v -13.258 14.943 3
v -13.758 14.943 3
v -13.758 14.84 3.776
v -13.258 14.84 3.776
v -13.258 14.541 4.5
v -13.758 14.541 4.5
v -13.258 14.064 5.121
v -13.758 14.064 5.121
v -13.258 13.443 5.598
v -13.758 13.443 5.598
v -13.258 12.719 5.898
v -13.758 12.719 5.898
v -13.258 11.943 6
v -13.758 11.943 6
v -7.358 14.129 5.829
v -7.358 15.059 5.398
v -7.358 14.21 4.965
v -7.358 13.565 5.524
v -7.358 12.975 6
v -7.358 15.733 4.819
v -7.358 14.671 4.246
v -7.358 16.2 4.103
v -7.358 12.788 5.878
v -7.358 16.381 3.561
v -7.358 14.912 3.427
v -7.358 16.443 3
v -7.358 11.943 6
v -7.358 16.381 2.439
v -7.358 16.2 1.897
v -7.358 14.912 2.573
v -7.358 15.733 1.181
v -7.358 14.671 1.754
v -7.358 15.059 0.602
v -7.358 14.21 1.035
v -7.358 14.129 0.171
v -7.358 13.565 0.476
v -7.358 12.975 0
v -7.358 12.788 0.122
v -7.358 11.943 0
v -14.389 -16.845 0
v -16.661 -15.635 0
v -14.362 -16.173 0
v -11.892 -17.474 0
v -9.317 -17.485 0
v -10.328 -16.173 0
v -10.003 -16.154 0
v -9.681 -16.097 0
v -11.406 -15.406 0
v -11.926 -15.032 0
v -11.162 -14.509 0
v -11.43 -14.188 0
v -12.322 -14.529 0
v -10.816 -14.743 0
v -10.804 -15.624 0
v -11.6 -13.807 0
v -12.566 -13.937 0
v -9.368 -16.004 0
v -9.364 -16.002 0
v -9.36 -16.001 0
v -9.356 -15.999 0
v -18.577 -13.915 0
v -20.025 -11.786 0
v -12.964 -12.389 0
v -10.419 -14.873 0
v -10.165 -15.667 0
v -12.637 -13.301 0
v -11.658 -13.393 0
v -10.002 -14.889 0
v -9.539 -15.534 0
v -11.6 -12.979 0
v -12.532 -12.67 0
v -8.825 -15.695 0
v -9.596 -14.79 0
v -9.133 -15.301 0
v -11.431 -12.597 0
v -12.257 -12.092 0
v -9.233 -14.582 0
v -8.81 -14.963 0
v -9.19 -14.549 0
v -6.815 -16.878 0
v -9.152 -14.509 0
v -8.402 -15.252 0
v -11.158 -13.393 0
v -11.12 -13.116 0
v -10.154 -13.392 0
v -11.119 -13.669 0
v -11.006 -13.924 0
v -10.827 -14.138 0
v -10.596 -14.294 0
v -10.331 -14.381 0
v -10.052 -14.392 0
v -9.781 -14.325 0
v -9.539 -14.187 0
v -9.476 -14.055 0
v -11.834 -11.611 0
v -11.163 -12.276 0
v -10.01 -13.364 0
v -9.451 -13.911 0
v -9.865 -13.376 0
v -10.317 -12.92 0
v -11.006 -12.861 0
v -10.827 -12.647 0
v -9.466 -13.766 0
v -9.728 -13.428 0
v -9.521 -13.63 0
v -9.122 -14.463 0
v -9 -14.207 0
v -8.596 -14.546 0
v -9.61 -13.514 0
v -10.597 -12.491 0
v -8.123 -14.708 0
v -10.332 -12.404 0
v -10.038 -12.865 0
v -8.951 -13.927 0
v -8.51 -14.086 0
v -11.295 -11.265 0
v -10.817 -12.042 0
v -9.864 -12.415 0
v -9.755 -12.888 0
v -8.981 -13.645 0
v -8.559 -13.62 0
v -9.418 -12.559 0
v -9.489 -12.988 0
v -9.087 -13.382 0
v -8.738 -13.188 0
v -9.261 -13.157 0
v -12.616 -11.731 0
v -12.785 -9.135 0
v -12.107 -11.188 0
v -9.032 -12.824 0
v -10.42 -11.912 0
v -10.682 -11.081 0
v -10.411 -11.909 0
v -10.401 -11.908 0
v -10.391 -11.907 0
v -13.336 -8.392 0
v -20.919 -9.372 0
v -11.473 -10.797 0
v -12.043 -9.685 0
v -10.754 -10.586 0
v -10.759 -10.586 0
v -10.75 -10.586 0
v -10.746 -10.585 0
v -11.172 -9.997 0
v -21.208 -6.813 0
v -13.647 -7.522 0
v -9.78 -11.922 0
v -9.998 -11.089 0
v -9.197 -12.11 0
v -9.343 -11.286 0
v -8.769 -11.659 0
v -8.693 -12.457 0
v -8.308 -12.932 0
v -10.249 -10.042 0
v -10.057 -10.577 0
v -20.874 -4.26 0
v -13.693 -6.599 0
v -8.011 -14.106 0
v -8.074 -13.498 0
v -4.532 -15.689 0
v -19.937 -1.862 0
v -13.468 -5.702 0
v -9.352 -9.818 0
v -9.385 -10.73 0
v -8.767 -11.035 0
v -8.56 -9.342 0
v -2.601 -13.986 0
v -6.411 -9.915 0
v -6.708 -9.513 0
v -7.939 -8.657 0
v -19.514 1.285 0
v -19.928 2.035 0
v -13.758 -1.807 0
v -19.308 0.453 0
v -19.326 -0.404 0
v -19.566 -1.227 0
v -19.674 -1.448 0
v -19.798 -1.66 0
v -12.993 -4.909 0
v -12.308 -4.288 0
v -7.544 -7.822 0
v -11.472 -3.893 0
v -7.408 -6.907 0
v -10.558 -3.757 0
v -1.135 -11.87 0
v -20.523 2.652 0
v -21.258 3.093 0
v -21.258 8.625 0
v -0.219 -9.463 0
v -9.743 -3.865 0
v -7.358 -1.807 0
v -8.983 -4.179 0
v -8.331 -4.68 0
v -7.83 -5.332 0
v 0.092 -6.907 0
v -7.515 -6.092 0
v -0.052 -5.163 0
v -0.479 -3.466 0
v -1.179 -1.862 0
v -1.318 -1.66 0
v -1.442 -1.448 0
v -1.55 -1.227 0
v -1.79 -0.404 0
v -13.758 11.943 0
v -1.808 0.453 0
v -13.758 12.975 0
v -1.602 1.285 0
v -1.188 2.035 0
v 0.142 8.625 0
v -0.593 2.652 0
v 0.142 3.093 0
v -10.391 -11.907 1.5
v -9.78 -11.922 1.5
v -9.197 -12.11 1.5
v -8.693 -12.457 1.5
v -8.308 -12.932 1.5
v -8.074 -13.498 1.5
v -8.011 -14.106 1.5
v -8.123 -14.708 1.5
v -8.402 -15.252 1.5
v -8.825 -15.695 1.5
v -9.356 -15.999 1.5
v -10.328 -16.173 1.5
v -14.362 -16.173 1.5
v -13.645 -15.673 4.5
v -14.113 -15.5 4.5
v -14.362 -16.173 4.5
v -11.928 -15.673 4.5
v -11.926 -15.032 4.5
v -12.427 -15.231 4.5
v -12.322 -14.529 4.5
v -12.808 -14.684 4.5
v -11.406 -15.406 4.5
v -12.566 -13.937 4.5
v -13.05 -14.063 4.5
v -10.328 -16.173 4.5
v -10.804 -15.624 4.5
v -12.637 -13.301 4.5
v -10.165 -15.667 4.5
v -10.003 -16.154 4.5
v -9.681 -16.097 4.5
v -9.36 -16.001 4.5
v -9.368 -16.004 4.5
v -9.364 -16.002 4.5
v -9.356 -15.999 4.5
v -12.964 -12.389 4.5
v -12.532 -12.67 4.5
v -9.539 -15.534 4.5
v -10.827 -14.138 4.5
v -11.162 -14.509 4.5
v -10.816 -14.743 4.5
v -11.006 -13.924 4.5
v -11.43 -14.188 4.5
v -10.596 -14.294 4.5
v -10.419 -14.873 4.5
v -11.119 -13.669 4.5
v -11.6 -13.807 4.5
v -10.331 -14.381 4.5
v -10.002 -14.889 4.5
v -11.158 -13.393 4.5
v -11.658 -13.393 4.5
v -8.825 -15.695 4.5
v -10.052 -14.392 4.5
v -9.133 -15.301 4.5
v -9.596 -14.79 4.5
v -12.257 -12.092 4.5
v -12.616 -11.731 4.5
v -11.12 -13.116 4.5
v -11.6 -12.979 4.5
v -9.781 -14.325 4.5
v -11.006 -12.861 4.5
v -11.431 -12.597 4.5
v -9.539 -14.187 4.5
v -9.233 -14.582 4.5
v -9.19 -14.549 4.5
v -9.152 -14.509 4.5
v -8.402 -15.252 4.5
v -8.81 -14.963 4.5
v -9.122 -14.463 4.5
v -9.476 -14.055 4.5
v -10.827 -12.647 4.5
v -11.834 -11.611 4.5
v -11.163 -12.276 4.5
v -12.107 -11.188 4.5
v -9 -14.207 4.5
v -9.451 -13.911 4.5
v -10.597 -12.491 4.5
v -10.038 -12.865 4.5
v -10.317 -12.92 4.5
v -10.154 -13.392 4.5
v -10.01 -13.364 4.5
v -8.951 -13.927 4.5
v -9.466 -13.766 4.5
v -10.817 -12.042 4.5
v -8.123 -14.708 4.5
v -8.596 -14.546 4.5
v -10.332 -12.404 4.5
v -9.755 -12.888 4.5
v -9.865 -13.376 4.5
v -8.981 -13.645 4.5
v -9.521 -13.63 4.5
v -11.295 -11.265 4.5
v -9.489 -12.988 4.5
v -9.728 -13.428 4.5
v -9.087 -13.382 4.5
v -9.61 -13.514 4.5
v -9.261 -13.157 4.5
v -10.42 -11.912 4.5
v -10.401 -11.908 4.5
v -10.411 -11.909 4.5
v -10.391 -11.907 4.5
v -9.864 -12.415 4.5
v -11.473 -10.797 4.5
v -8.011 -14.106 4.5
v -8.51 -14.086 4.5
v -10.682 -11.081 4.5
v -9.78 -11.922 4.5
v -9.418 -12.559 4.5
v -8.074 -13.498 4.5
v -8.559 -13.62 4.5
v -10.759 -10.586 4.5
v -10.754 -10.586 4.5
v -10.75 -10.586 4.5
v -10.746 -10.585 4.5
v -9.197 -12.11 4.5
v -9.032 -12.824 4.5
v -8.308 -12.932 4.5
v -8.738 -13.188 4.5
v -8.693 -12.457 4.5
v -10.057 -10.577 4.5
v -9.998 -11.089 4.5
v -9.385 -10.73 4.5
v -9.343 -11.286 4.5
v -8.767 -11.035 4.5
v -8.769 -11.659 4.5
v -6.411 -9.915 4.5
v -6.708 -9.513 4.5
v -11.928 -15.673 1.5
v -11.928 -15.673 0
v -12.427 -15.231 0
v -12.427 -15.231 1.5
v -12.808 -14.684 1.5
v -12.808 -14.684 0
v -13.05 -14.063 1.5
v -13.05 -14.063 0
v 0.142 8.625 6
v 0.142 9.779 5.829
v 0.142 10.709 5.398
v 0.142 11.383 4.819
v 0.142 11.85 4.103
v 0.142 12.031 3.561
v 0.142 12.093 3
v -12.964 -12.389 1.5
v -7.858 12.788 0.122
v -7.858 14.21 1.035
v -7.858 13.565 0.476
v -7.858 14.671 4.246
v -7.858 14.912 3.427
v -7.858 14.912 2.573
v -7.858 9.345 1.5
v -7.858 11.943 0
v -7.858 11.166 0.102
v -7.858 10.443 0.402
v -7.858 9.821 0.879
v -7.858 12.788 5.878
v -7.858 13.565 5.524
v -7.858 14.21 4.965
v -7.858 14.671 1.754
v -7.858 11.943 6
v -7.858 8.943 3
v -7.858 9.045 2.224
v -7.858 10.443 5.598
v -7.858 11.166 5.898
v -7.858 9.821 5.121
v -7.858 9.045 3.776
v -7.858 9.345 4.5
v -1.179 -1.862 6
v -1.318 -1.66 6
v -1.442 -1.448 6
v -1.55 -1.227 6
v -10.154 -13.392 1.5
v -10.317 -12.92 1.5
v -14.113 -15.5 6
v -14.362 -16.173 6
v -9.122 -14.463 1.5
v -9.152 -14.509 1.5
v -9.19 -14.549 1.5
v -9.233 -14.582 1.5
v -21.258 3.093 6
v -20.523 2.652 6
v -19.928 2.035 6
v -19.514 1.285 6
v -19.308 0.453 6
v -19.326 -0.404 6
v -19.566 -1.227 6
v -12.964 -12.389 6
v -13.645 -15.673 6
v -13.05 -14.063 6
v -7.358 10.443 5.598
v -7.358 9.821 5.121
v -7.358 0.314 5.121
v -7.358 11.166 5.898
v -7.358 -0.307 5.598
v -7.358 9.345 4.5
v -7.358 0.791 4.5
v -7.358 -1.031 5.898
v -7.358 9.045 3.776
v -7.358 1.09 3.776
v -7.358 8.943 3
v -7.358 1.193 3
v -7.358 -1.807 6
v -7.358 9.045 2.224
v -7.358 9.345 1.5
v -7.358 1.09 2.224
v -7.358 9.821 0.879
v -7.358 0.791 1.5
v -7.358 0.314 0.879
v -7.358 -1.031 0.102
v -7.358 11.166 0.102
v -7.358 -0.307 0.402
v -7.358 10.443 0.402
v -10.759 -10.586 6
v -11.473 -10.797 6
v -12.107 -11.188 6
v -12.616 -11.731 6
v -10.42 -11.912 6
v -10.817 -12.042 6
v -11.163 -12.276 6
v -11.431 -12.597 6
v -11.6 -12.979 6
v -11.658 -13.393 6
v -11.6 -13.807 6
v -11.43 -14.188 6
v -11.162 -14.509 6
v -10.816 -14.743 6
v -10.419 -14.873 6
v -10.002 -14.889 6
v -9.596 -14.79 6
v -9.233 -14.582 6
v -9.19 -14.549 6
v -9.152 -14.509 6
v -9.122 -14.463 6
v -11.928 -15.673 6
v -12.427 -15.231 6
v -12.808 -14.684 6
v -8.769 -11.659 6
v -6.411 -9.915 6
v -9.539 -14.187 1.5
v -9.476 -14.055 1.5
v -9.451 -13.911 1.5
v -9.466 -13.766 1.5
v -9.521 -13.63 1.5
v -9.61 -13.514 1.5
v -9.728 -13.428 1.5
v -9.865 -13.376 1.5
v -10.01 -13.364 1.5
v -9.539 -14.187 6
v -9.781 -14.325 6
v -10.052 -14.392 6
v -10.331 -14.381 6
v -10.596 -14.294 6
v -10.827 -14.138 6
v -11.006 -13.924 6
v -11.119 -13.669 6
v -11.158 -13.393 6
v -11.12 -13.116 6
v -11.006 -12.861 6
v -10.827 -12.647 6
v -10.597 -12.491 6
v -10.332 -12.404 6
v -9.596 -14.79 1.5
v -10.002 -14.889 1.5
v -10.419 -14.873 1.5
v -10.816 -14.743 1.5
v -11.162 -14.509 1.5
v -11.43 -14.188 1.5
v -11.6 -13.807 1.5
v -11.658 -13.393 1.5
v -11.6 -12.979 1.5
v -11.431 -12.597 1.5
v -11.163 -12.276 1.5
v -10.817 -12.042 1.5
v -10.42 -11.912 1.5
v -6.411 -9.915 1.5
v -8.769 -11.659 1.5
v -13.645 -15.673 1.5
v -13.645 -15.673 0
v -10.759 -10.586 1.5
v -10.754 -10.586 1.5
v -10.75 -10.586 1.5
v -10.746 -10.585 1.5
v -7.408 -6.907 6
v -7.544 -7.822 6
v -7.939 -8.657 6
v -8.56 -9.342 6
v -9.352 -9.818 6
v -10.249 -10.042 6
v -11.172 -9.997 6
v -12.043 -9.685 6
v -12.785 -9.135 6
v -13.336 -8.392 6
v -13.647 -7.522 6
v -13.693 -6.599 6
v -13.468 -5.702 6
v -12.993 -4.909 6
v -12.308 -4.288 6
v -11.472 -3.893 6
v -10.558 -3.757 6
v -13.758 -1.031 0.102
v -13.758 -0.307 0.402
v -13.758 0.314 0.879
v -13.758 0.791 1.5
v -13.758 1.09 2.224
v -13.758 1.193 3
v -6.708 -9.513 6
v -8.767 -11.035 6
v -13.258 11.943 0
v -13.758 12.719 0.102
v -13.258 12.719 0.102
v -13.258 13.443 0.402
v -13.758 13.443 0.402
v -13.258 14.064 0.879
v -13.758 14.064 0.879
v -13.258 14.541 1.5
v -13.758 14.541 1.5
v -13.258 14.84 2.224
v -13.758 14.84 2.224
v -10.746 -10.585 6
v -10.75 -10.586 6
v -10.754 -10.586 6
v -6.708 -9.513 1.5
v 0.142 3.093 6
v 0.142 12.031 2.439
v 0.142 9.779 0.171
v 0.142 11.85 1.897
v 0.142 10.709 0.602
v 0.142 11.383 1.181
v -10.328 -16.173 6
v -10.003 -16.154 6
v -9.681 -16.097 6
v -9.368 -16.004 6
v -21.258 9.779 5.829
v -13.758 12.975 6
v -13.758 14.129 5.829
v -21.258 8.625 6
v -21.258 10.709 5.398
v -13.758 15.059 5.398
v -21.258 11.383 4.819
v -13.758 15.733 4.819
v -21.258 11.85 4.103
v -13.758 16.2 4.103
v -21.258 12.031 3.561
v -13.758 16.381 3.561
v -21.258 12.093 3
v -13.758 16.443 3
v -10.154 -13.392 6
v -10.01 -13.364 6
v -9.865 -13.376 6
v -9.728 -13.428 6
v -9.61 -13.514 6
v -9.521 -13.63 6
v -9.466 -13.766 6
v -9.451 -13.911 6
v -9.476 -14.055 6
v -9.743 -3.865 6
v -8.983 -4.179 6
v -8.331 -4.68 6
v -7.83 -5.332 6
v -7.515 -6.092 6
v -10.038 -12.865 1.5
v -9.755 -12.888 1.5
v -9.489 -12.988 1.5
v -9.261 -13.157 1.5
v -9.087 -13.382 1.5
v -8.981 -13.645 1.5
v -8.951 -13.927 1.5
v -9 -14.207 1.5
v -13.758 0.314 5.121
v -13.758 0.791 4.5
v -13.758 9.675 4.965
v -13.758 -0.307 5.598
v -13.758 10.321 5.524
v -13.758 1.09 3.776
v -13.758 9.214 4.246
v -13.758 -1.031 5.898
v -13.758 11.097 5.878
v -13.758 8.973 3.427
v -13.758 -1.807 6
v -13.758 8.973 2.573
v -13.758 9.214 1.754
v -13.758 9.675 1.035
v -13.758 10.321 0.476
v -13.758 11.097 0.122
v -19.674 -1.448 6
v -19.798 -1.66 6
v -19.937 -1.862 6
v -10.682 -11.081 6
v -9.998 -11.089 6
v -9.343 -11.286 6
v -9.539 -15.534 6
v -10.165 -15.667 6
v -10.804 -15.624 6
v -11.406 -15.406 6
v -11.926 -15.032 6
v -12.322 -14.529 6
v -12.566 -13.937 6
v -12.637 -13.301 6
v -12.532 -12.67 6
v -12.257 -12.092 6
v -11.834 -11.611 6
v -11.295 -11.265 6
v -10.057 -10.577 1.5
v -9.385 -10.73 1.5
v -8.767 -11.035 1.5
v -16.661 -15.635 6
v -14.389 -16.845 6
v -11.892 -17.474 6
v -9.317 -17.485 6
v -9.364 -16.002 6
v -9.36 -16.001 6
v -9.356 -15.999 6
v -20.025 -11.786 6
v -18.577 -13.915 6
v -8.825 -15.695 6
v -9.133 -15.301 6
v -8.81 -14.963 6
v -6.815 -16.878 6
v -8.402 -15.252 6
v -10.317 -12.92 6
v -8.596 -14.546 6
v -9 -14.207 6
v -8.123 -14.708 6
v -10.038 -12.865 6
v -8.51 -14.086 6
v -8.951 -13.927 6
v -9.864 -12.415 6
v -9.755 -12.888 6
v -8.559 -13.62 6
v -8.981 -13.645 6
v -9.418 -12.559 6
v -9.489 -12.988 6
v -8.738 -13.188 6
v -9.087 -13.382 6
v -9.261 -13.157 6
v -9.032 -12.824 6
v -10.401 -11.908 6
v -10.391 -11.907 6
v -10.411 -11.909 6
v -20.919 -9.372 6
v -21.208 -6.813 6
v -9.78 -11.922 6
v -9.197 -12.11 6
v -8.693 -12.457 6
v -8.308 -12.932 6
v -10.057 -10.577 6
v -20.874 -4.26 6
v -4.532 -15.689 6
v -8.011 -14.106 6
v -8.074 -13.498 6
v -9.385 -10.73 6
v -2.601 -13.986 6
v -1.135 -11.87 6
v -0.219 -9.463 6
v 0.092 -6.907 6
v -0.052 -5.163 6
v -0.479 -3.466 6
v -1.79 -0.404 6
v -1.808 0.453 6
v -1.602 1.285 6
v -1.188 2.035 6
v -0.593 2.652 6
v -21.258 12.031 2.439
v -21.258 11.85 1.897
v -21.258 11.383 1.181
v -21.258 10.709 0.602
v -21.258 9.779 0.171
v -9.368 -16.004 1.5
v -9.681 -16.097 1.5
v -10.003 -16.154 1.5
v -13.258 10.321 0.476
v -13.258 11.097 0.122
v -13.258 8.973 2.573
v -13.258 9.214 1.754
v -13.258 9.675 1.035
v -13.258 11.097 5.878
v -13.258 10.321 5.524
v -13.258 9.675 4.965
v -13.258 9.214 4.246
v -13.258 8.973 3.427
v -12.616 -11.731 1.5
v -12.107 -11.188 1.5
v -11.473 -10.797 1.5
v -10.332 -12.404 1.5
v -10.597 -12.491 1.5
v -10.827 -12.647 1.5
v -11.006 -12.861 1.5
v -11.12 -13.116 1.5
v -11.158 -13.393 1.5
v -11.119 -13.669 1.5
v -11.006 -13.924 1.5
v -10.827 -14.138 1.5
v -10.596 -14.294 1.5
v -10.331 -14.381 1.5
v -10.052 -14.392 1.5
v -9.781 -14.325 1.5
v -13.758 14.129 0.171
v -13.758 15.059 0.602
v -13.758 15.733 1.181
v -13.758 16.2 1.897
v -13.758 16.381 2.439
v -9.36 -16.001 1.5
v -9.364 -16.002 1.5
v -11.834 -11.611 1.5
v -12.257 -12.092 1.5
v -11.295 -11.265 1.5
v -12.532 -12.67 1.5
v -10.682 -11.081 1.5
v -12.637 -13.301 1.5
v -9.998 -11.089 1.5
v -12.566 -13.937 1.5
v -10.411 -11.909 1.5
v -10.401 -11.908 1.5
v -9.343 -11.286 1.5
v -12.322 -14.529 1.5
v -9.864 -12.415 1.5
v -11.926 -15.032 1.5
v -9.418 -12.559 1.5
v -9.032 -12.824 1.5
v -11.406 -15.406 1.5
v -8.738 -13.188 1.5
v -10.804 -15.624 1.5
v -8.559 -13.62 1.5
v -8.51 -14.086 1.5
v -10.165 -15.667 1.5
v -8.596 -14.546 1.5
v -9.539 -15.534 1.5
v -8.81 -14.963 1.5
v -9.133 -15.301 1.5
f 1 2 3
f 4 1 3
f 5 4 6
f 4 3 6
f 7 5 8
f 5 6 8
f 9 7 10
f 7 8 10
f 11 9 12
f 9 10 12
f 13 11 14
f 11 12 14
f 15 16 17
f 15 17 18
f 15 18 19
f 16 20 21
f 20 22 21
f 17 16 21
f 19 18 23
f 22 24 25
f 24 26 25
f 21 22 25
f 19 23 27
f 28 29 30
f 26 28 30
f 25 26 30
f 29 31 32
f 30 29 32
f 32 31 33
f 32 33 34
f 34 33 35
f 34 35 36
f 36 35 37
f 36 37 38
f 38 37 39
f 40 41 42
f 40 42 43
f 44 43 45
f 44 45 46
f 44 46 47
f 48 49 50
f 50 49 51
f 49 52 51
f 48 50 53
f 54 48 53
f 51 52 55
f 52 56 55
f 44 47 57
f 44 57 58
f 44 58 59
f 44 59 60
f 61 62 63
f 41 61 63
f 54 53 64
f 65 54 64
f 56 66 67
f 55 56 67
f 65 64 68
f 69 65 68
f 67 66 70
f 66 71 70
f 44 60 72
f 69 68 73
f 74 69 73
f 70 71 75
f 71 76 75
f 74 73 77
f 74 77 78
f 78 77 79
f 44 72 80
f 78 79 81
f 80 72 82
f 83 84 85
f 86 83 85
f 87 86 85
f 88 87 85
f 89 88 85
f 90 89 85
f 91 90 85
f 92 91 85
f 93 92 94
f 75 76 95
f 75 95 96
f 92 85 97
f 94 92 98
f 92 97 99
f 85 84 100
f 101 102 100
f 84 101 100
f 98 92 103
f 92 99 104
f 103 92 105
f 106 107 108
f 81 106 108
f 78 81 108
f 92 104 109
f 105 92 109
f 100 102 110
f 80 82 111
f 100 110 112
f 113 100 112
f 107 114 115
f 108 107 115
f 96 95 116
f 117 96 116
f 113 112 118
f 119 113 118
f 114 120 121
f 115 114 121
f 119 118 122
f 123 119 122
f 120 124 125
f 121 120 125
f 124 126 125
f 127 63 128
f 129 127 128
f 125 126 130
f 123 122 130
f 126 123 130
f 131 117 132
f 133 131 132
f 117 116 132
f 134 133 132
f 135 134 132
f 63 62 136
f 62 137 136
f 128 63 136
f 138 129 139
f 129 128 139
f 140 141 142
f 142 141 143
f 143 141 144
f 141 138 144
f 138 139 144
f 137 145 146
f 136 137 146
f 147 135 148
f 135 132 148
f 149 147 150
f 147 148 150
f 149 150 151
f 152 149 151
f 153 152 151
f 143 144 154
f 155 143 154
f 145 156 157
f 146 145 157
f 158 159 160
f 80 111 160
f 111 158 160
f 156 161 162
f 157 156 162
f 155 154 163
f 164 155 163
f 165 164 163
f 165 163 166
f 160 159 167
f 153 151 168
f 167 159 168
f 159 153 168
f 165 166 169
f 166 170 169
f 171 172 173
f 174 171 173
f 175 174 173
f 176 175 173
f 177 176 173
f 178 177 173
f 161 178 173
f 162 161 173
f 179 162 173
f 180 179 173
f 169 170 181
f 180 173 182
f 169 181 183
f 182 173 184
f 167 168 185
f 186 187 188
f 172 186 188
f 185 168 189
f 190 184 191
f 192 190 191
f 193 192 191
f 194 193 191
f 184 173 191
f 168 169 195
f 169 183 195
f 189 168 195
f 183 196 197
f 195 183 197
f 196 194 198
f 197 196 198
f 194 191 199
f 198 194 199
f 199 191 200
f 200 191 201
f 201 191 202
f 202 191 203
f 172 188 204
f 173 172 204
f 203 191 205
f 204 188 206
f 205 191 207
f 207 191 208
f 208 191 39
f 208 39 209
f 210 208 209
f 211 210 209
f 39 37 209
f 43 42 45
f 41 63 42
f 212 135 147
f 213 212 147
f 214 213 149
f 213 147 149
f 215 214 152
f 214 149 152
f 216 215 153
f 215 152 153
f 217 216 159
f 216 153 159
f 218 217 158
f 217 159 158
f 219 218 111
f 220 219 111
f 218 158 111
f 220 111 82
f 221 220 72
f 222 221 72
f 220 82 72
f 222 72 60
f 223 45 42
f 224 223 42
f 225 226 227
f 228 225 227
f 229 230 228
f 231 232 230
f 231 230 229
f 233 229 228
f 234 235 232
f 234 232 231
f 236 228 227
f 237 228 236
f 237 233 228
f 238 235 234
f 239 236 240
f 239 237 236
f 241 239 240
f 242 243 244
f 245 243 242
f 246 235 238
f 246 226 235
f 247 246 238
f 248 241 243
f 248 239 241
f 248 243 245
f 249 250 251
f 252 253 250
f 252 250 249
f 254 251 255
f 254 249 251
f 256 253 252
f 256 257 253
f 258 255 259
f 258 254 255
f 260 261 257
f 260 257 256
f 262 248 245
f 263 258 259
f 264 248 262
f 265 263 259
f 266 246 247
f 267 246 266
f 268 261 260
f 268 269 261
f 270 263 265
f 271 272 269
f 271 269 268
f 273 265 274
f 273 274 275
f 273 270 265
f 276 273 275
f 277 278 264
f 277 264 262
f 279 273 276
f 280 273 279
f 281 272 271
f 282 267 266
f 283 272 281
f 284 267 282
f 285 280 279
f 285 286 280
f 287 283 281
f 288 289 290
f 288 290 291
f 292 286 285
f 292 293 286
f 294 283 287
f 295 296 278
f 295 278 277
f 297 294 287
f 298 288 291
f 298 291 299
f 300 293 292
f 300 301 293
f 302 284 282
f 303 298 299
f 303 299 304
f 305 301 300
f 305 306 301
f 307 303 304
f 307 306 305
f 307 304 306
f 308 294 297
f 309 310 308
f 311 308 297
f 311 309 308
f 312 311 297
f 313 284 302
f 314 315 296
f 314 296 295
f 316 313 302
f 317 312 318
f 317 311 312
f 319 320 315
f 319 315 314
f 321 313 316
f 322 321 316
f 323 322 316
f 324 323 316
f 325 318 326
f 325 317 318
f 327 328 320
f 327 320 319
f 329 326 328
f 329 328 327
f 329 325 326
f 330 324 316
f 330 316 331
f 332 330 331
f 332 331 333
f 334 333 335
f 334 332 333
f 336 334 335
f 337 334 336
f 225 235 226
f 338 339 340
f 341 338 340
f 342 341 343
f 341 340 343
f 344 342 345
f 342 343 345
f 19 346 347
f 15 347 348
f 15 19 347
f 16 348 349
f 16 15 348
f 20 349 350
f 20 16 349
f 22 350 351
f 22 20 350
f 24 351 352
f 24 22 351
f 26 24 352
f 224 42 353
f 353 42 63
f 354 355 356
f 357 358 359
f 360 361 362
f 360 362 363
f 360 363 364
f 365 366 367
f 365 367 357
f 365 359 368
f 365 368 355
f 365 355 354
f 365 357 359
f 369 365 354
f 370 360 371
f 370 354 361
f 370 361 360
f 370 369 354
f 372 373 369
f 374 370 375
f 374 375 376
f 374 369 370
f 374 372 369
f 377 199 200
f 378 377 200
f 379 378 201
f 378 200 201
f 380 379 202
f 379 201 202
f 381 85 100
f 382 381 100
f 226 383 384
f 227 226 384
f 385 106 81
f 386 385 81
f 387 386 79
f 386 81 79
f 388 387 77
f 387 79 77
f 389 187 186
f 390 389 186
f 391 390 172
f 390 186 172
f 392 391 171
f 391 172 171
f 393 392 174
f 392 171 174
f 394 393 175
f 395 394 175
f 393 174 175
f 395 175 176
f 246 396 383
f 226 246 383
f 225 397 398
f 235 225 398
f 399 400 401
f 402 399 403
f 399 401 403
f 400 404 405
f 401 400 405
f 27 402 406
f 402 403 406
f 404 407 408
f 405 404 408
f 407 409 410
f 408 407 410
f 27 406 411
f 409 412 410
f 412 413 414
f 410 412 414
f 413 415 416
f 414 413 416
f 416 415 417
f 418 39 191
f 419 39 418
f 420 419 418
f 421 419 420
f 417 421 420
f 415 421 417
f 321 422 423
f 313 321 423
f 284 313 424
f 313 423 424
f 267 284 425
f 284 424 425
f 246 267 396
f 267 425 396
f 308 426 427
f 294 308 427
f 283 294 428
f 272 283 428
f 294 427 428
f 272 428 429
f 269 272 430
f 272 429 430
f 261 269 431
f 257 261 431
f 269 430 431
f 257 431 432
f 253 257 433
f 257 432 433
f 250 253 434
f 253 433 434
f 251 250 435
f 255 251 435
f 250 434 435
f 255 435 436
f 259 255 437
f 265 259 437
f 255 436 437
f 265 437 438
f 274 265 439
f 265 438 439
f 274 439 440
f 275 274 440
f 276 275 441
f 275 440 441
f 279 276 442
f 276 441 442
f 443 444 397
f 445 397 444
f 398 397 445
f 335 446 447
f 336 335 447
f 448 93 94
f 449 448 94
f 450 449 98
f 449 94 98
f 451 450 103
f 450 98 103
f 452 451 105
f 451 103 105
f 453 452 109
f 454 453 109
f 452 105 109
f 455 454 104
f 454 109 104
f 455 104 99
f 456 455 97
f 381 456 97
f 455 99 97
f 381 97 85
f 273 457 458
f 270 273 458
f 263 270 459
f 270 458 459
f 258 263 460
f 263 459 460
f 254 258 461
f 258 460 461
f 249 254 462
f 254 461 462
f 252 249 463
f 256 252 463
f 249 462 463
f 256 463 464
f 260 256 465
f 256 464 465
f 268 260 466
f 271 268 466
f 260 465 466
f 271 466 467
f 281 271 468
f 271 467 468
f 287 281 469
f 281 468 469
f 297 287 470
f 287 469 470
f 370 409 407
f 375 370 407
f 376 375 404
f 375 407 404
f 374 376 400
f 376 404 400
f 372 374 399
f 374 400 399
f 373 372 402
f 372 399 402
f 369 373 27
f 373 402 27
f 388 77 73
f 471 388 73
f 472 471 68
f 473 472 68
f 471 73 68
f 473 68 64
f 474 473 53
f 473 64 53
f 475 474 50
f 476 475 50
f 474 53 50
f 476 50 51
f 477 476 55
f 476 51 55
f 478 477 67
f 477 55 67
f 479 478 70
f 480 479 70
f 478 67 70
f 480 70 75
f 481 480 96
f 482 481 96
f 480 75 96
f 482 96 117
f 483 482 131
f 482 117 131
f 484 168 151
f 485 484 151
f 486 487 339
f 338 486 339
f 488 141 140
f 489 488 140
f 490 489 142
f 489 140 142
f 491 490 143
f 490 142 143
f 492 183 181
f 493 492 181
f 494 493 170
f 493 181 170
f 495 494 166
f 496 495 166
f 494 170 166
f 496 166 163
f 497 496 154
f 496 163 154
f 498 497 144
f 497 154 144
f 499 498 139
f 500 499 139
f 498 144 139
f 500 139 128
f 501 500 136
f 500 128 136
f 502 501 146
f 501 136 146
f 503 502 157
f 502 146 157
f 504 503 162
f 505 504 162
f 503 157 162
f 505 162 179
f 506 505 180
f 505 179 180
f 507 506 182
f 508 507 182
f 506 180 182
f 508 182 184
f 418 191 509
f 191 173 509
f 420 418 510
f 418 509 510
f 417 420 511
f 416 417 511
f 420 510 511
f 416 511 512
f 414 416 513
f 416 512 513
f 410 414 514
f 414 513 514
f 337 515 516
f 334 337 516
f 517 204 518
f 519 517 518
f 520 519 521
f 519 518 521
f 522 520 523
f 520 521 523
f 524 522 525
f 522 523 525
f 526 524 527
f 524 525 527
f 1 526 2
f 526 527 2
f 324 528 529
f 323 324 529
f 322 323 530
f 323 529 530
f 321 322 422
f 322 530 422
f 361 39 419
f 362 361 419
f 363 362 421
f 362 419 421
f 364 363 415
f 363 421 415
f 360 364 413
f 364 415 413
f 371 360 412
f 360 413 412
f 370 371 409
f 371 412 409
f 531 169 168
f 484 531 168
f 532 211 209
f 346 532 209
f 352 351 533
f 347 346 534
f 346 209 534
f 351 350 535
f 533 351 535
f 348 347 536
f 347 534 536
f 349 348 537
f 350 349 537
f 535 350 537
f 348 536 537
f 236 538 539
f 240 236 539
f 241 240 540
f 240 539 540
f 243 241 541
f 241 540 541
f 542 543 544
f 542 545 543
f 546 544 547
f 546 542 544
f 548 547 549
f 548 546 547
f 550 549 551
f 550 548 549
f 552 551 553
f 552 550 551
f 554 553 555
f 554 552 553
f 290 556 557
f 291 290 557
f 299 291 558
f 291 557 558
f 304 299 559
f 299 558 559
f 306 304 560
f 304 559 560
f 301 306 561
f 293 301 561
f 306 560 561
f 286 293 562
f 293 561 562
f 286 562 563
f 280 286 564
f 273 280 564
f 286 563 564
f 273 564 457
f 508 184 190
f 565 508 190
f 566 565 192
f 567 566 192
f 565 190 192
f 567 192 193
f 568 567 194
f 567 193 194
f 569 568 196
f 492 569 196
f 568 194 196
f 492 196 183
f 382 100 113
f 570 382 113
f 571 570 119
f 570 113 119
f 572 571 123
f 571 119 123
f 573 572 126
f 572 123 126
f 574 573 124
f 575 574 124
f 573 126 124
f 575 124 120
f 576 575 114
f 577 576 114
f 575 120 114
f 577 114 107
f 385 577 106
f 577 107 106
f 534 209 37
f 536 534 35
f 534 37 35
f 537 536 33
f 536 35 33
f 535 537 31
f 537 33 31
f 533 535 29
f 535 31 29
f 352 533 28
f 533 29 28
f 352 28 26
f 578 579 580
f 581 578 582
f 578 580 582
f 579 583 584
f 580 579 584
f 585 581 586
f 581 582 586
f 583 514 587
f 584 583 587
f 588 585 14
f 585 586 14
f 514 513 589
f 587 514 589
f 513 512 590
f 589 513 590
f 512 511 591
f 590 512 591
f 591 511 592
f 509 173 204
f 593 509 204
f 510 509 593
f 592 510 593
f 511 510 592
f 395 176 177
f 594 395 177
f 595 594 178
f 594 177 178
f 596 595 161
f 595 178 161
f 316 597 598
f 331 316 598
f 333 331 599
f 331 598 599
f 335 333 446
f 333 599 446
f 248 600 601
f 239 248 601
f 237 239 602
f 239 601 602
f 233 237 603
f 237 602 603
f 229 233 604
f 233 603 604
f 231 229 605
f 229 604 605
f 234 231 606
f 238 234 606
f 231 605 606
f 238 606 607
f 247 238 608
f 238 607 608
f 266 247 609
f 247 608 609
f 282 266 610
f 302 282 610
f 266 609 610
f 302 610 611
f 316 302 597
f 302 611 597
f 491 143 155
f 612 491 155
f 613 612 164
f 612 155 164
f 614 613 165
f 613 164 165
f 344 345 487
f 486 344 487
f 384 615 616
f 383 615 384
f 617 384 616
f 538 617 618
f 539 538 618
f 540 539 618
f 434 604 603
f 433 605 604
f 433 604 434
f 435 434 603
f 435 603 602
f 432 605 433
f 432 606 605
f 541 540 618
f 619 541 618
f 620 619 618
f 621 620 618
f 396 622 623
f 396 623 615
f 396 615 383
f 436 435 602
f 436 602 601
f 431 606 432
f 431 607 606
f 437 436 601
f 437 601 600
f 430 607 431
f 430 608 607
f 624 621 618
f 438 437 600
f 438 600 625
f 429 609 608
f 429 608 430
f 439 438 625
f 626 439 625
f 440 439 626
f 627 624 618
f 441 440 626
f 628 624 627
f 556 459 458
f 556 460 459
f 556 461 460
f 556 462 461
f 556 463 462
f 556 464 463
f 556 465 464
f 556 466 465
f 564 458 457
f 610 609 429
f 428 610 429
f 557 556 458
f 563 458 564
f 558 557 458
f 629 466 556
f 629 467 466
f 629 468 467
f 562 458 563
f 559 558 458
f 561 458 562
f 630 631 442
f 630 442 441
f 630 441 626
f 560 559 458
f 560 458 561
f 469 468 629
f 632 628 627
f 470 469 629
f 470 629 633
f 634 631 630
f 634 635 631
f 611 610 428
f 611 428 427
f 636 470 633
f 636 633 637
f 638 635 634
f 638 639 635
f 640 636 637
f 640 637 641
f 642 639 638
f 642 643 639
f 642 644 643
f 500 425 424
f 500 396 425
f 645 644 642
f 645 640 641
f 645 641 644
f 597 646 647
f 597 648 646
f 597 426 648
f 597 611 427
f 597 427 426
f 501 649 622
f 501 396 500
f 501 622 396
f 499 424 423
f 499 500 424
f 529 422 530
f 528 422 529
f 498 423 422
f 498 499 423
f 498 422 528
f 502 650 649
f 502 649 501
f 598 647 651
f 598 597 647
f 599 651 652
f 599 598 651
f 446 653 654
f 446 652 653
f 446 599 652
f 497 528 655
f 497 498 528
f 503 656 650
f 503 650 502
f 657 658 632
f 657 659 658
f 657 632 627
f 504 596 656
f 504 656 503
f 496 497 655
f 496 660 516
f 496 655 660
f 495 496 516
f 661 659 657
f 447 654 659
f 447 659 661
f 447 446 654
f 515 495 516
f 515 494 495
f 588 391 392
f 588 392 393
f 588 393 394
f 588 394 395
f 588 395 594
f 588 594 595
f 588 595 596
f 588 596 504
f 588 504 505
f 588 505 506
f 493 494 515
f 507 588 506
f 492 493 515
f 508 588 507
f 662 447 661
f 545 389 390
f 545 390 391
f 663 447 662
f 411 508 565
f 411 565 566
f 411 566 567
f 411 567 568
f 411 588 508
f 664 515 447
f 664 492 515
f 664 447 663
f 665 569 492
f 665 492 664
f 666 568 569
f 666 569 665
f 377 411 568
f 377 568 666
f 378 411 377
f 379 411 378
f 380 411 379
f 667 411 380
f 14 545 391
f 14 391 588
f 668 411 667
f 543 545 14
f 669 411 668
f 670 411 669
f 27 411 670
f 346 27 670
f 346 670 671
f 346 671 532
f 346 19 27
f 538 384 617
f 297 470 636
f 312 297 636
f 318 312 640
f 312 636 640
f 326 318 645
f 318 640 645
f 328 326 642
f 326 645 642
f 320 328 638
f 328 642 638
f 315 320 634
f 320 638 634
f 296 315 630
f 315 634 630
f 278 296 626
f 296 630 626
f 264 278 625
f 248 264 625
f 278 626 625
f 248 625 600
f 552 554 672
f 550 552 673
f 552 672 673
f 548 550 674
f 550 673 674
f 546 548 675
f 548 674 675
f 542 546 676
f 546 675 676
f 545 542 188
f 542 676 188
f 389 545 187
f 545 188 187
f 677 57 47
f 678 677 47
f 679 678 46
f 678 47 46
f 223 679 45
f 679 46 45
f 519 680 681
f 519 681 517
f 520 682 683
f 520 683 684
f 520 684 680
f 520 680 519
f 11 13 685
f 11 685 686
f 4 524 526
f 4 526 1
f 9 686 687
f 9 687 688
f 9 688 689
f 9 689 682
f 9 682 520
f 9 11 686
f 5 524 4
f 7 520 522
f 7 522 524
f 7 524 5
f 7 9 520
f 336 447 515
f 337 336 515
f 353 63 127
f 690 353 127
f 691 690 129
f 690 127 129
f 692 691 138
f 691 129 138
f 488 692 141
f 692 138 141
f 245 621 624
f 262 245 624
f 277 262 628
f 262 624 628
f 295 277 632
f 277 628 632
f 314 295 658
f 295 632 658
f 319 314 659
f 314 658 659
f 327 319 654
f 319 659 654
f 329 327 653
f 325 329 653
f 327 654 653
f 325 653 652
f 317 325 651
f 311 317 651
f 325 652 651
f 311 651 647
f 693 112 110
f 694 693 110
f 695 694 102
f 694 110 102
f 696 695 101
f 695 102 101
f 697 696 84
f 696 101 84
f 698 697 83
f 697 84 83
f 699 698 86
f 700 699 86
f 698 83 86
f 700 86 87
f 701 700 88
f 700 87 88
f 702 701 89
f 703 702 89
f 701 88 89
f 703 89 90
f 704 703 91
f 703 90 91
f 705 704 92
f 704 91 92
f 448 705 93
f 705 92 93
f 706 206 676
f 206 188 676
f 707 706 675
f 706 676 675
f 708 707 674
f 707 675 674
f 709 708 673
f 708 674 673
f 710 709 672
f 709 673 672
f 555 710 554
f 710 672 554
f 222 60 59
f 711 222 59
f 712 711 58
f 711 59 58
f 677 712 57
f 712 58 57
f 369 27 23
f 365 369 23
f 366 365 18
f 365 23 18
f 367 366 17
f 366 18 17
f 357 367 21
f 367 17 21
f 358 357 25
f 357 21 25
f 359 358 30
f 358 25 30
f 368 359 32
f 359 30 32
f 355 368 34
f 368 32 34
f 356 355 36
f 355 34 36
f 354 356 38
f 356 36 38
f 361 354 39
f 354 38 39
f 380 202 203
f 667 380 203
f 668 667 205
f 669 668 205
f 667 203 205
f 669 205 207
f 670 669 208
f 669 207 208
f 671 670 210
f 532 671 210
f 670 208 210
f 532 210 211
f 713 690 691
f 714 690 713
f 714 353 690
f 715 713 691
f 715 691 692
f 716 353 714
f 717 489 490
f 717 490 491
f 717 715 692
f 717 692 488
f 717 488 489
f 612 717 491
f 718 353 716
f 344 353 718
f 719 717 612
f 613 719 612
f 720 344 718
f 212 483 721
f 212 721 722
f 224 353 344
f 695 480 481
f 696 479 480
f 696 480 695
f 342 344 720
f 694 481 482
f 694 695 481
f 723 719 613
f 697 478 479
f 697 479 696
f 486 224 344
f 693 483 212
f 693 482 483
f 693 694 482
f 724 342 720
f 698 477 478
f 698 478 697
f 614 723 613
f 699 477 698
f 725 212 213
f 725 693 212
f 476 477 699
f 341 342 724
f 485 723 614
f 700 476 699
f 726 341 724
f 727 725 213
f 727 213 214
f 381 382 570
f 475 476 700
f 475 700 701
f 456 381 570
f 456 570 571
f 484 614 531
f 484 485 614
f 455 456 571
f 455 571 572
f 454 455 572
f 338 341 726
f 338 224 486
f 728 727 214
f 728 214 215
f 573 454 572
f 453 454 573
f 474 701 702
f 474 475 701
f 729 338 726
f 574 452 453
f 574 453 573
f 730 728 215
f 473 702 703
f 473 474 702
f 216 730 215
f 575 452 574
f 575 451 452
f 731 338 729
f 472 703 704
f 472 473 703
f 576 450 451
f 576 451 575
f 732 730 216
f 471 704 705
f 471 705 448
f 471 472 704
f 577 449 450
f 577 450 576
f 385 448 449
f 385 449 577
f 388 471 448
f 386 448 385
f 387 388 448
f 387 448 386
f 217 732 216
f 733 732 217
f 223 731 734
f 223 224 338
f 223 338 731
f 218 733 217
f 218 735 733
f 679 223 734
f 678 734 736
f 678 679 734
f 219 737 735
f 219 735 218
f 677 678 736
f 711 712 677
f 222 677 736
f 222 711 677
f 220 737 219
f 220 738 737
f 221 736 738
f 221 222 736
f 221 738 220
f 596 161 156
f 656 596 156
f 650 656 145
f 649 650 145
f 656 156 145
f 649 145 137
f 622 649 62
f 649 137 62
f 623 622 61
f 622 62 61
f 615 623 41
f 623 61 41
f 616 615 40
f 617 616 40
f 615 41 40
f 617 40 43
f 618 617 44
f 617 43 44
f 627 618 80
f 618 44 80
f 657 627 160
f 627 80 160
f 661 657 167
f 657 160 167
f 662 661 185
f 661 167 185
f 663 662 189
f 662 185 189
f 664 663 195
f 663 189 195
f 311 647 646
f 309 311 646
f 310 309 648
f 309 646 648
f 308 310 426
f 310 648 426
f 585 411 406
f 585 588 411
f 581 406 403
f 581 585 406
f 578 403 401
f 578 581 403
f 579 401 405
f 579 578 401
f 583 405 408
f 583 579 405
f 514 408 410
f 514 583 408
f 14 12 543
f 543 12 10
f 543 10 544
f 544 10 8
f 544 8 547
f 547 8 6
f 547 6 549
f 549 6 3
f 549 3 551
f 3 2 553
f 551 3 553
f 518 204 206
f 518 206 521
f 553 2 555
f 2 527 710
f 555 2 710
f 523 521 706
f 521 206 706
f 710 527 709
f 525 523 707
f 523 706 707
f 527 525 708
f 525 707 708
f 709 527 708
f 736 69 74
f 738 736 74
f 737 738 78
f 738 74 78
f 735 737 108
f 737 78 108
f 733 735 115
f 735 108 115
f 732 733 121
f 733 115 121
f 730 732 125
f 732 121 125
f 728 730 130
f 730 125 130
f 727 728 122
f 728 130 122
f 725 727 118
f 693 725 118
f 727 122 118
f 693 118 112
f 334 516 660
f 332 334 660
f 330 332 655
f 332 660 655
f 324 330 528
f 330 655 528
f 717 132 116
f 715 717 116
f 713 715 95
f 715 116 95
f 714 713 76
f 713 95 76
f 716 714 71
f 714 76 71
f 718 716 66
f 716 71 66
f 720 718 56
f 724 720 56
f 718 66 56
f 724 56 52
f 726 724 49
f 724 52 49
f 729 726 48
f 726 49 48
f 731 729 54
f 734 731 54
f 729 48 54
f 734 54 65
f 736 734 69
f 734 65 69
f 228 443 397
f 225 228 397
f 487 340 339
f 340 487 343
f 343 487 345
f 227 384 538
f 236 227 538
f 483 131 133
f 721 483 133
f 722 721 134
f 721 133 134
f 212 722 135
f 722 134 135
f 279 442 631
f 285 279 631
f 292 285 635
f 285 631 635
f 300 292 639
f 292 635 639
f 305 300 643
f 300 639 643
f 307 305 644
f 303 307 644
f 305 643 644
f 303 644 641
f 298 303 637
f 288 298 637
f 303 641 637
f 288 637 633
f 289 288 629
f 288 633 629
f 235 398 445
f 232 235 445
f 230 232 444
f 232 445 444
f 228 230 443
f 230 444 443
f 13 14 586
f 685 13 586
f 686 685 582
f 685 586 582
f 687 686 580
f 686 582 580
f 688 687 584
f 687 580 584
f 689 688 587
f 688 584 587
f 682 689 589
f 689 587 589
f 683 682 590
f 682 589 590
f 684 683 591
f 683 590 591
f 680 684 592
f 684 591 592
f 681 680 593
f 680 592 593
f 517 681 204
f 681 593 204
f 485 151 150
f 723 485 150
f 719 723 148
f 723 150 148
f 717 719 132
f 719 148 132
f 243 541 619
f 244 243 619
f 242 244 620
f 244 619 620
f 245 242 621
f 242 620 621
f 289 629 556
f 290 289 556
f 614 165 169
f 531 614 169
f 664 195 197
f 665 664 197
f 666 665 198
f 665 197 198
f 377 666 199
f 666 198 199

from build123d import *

# Parameters (mm, degrees)
F1_DEPTH  = 6
F3_DEPTH  = 0.5
F5_DEPTH  = 0.5
F6_R      = 2.99999
F7_R      = 2.99999
F9_DEPTH  = 1.5
F11_DEPTH = 1.5


# Not quite as in the source:
# - a fillet or chamfer is up to 0.001 mm smaller than in the source, because OpenCascade refuses the exact size


with BuildPart() as f1:
    # F0 (on Top) → F1 (new body)
    with BuildSketch(Plane.XY):
        with BuildLine():
            ThreePointArc((-21.257927263, 3.0925971456), (-19.5135237331, 1.2849088277), (-19.5663380414, -1.2266427602))
            ThreePointArc((-19.5663380414, -1.2266427602), (-17.0596555887, 1.5276447909), (-13.757927263, 3.2504758611))
            Line((-13.757927263, 3.2504758611), (-13.757927263, 16.4425971456))
            Line((-13.757927263, 16.4425971456), (-21.257927263, 12.0925971456))
            Line((-21.257927263, 12.0925971456), (-21.257927263, 3.0925971456))
        make_face()
        with BuildLine():
            ThreePointArc((-19.937029438, -1.8621137259), (-13.1593751133, -17.2347921219), (0.092072737, -6.9074028544))
            ThreePointArc((0.092072737, -6.9074028544), (-0.2305379955, -4.3059550041), (-1.178825088, -1.8621137259))
            ThreePointArc((-1.178825088, -1.8621137259), (-1.3821012217, -1.5548376637), (-1.5495164847, -1.2266427602))
            ThreePointArc((-1.5495164847, -1.2266427602), (-4.0561989374, 1.5276447909), (-7.357927263, 3.2504758611))
            Line((-7.357927263, 3.2504758611), (-7.357927263, 1.1925971456))
            Line((-7.357927263, 1.1925971456), (-10.557927263, 1.1925971456))
            Line((-10.557927263, 1.1925971456), (-13.757927263, 1.1925971456))
            Line((-13.757927263, 1.1925971456), (-13.757927263, 3.2504758611))
            ThreePointArc((-13.757927263, 3.2504758611), (-17.0596555887, 1.5276447909), (-19.5663380414, -1.2266427602))
            ThreePointArc((-19.5663380414, -1.2266427602), (-19.7337533043, -1.5548376637), (-19.937029438, -1.8621137259))
        make_face()
        with BuildLine():
            ThreePointArc((-7.407927263, -6.9074028544), (-12.7853136237, -9.1347892152), (-10.557927263, -3.7574028544))
            ThreePointArc((-10.557927263, -3.7574028544), (-8.3305409023, -4.6800164937), (-7.407927263, -6.9074028544))
        make_face(mode=Mode.SUBTRACT)
        with BuildLine():
            ThreePointArc((-7.357927263, 3.2504758611), (-4.0561989374, 1.5276447909), (-1.5495164847, -1.2266427602))
            ThreePointArc((-1.5495164847, -1.2266427602), (-1.6023307929, 1.2849088277), (0.142072737, 3.0925971456))
            Line((0.142072737, 3.0925971456), (0.142072737, 12.0925971456))
            Line((0.142072737, 12.0925971456), (-7.357927263, 16.4425971456))
            Line((-7.357927263, 16.4425971456), (-7.357927263, 3.2504758611))
        make_face()
    extrude(amount=F1_DEPTH)

    # F2 (on face) → F3 (join)
    with BuildSketch(Plane.YZ.offset(-13.757927263)):
        with BuildLine():
            ThreePointArc((11.9425971456, 0), (14.0639174891, 0.8786796564), (14.9425971456, 3))
            ThreePointArc((14.9425971456, 3), (14.0639174891, 5.1213203436), (11.9425971456, 6))
            ThreePointArc((11.9425971456, 6), (8.9425971456, 3), (11.9425971456, 0))
        make_face()
    extrude(amount=F3_DEPTH)

    # F4 (on face) → F5 (join)
    with BuildSketch(Plane(origin=(-7.357927263, 0, 0), x_dir=(0, -1, 0), z_dir=(-1, 0, 0))):
        with BuildLine():
            ThreePointArc((-11.9425971456, 0), (-9.821276802, 0.8786796564), (-8.9425971456, 3))
            ThreePointArc((-8.9425971456, 3), (-9.821276802, 5.1213203436), (-11.9425971456, 6))
            ThreePointArc((-11.9425971456, 6), (-14.9425971456, 3), (-11.9425971456, 0))
        make_face()
    extrude(amount=F5_DEPTH)

    # F6 (radius 3 in the source; OpenCascade refuses exactly that, so slightly less here)
    f6_edges = [f1.edges().sort_by_distance(p)[0] for p in [
        (-10.557927, 1.192597, 0),
        (-10.557927, 1.192597, 6),
    ]]
    fillet(f6_edges, radius=F6_R)

    # F7 (radius 3 in the source; OpenCascade refuses exactly that, so slightly less here)
    f7_edges = [f1.edges().sort_by_distance(p)[0] for p in [
        (-3.607927, 14.267597, 6),
        (-3.607927, 14.267597, 0),
        (-17.507927, 14.267597, 6),
        (-17.507927, 14.267597, 0),
    ]]
    fillet(f7_edges, radius=F7_R)

    # F8 (on face) → F9 (cut)
    with BuildSketch(Plane.XY.offset(6)):
        with BuildLine():
            ThreePointArc((-10.3315528874, -12.4037176265), (-8.5586184667, -13.6203290978), (-9.5390766145, -15.534001419))
            ThreePointArc((-9.5390766145, -15.534001419), (-12.5657731947, -13.9373786235), (-10.6819972396, -11.0805473911))
            ThreePointArc((-10.6819972396, -11.0805473911), (-9.6634977684, -11.1643464321), (-8.7690087855, -11.6585659294))
            Line((-8.7690087855, -11.6585659294), (-6.4111007419, -9.9150485592))
            Line((-6.4111007419, -9.9150485592), (-6.7083751907, -9.5130188313))
            Line((-6.7083751907, -9.5130188313), (-8.7669816313, -11.0352224208))
            ThreePointArc((-8.7669816313, -11.0352224208), (-9.7165335049, -10.6334325304), (-10.7464416358, -10.5847178642))
            ThreePointArc((-10.7464416358, -10.5847178642), (-10.7524542145, -10.5858192208), (-10.7585352096, -10.5864401769))
            ThreePointArc((-10.7585352096, -10.5864401769), (-12.1066928754, -11.1876295757), (-12.9640803834, -12.3892303605))
            Line((-12.9640803834, -12.3892303605), (-14.113424494, -15.4995148073))
            Line((-14.113424494, -15.4995148073), (-14.3623176984, -16.1730543119))
            Line((-14.3623176984, -16.1730543119), (-13.6445064842, -16.1730543119))
            Line((-13.6445064842, -16.1730543119), (-10.3284124834, -16.1730543119))
            ThreePointArc((-10.3284124834, -16.1730543119), (-9.8409208438, -16.1304430443), (-9.3682147094, -16.0039016311))
            ThreePointArc((-9.3682147094, -16.0039016311), (-9.361792524, -16.0016997739), (-9.355524465, -15.9990913118))
            ThreePointArc((-9.355524465, -15.9990913118), (-8.073910256, -13.497618257), (-10.3914165669, -11.9073142221))
            ThreePointArc((-10.3914165669, -11.9073142221), (-10.4058889802, -11.9084903608), (-10.4200689017, -11.9116150811))
            ThreePointArc((-10.4200689017, -11.9116150811), (-11.528535351, -14.0033516217), (-9.233119707, -14.5822528616))
            ThreePointArc((-9.233119707, -14.5822528616), (-9.1701495178, -14.5297943991), (-9.1224097378, -14.46317572))
            ThreePointArc((-9.1224097378, -14.46317572), (-9.1661029488, -13.263231915), (-10.3166224177, -12.9196053972))
            Line((-10.3166224177, -12.9196053972), (-10.1537286636, -13.392326906))
            ThreePointArc((-10.1537286636, -13.392326906), (-9.561565173, -13.5691888225), (-9.5390766145, -14.1867906375))
            ThreePointArc((-9.5390766145, -14.1867906375), (-11.0716295176, -13.8002825215), (-10.3315528874, -12.4037176265))
        make_face()
        with BuildLine():
            ThreePointArc((-13.0496571933, -14.0633096924), (-12.6340614687, -14.9692167321), (-11.9283702953, -15.6730543119))
            Line((-11.9283702953, -15.6730543119), (-13.6445064842, -15.6730543119))
            Line((-13.6445064842, -15.6730543119), (-13.0496571933, -14.0633096924))
        make_face(mode=Mode.SUBTRACT)
    extrude(amount=-F9_DEPTH, mode=Mode.SUBTRACT)

    # F10 (on face) → F11 (cut)
    with BuildSketch(Plane(origin=(0, 0, 0), x_dir=(1, 0, 0), z_dir=(0, 0, -1))):
        with BuildLine():
            Line((-6.4111007419, 9.9150485592), (-8.7690087855, 11.6585659294))
            ThreePointArc((-8.7690087855, 11.6585659294), (-9.6634977684, 11.1643464321), (-10.6819972396, 11.0805473911))
            ThreePointArc((-10.6819972396, 11.0805473911), (-12.5657731947, 13.9373786235), (-9.5390766145, 15.534001419))
            ThreePointArc((-9.5390766145, 15.534001419), (-8.5586184667, 13.6203290978), (-10.3315528874, 12.4037176265))
            ThreePointArc((-10.3315528874, 12.4037176265), (-11.0716295176, 13.8002825215), (-9.5390766145, 14.1867906375))
            ThreePointArc((-9.5390766145, 14.1867906375), (-9.561565173, 13.5691888225), (-10.1537286636, 13.392326906))
            Line((-10.1537286636, 13.392326906), (-10.3166224177, 12.9196053972))
            ThreePointArc((-10.3166224177, 12.9196053972), (-9.1661029488, 13.263231915), (-9.1224097378, 14.46317572))
            ThreePointArc((-9.1224097378, 14.46317572), (-9.1701495178, 14.5297943991), (-9.233119707, 14.5822528616))
            ThreePointArc((-9.233119707, 14.5822528616), (-11.528535351, 14.0033516217), (-10.4200689017, 11.9116150811))
            ThreePointArc((-10.4200689017, 11.9116150811), (-10.4058889802, 11.9084903608), (-10.3914165669, 11.9073142221))
            ThreePointArc((-10.3914165669, 11.9073142221), (-8.073910256, 13.497618257), (-9.355524465, 15.9990913118))
            ThreePointArc((-9.355524465, 15.9990913118), (-9.361792524, 16.0016997739), (-9.3682147094, 16.0039016311))
            ThreePointArc((-9.3682147094, 16.0039016311), (-9.8409208438, 16.1304430443), (-10.3284124834, 16.1730543119))
            Line((-10.3284124834, 16.1730543119), (-14.3623176984, 16.1730543119))
            Line((-14.3623176984, 16.1730543119), (-12.9640803834, 12.3892303605))
            ThreePointArc((-12.9640803834, 12.3892303605), (-12.1066928754, 11.1876295757), (-10.7585352096, 10.5864401769))
            ThreePointArc((-10.7585352096, 10.5864401769), (-10.7524542145, 10.5858192208), (-10.7464416358, 10.5847178642))
            ThreePointArc((-10.7464416358, 10.5847178642), (-9.7165335049, 10.6334325304), (-8.7669816313, 11.0352224208))
            Line((-8.7669816313, 11.0352224208), (-6.7083751907, 9.5130188313))
            Line((-6.7083751907, 9.5130188313), (-6.4111007419, 9.9150485592))
        make_face()
        with BuildLine():
            ThreePointArc((-11.9283702953, 15.6730543119), (-12.6340614687, 14.9692167321), (-13.0496571933, 14.0633096924))
            Line((-13.0496571933, 14.0633096924), (-13.6445064842, 15.6730543119))
            Line((-13.6445064842, 15.6730543119), (-11.9283702953, 15.6730543119))
        make_face(mode=Mode.SUBTRACT)
    extrude(amount=-F11_DEPTH, mode=Mode.SUBTRACT)


solid = f1.part
